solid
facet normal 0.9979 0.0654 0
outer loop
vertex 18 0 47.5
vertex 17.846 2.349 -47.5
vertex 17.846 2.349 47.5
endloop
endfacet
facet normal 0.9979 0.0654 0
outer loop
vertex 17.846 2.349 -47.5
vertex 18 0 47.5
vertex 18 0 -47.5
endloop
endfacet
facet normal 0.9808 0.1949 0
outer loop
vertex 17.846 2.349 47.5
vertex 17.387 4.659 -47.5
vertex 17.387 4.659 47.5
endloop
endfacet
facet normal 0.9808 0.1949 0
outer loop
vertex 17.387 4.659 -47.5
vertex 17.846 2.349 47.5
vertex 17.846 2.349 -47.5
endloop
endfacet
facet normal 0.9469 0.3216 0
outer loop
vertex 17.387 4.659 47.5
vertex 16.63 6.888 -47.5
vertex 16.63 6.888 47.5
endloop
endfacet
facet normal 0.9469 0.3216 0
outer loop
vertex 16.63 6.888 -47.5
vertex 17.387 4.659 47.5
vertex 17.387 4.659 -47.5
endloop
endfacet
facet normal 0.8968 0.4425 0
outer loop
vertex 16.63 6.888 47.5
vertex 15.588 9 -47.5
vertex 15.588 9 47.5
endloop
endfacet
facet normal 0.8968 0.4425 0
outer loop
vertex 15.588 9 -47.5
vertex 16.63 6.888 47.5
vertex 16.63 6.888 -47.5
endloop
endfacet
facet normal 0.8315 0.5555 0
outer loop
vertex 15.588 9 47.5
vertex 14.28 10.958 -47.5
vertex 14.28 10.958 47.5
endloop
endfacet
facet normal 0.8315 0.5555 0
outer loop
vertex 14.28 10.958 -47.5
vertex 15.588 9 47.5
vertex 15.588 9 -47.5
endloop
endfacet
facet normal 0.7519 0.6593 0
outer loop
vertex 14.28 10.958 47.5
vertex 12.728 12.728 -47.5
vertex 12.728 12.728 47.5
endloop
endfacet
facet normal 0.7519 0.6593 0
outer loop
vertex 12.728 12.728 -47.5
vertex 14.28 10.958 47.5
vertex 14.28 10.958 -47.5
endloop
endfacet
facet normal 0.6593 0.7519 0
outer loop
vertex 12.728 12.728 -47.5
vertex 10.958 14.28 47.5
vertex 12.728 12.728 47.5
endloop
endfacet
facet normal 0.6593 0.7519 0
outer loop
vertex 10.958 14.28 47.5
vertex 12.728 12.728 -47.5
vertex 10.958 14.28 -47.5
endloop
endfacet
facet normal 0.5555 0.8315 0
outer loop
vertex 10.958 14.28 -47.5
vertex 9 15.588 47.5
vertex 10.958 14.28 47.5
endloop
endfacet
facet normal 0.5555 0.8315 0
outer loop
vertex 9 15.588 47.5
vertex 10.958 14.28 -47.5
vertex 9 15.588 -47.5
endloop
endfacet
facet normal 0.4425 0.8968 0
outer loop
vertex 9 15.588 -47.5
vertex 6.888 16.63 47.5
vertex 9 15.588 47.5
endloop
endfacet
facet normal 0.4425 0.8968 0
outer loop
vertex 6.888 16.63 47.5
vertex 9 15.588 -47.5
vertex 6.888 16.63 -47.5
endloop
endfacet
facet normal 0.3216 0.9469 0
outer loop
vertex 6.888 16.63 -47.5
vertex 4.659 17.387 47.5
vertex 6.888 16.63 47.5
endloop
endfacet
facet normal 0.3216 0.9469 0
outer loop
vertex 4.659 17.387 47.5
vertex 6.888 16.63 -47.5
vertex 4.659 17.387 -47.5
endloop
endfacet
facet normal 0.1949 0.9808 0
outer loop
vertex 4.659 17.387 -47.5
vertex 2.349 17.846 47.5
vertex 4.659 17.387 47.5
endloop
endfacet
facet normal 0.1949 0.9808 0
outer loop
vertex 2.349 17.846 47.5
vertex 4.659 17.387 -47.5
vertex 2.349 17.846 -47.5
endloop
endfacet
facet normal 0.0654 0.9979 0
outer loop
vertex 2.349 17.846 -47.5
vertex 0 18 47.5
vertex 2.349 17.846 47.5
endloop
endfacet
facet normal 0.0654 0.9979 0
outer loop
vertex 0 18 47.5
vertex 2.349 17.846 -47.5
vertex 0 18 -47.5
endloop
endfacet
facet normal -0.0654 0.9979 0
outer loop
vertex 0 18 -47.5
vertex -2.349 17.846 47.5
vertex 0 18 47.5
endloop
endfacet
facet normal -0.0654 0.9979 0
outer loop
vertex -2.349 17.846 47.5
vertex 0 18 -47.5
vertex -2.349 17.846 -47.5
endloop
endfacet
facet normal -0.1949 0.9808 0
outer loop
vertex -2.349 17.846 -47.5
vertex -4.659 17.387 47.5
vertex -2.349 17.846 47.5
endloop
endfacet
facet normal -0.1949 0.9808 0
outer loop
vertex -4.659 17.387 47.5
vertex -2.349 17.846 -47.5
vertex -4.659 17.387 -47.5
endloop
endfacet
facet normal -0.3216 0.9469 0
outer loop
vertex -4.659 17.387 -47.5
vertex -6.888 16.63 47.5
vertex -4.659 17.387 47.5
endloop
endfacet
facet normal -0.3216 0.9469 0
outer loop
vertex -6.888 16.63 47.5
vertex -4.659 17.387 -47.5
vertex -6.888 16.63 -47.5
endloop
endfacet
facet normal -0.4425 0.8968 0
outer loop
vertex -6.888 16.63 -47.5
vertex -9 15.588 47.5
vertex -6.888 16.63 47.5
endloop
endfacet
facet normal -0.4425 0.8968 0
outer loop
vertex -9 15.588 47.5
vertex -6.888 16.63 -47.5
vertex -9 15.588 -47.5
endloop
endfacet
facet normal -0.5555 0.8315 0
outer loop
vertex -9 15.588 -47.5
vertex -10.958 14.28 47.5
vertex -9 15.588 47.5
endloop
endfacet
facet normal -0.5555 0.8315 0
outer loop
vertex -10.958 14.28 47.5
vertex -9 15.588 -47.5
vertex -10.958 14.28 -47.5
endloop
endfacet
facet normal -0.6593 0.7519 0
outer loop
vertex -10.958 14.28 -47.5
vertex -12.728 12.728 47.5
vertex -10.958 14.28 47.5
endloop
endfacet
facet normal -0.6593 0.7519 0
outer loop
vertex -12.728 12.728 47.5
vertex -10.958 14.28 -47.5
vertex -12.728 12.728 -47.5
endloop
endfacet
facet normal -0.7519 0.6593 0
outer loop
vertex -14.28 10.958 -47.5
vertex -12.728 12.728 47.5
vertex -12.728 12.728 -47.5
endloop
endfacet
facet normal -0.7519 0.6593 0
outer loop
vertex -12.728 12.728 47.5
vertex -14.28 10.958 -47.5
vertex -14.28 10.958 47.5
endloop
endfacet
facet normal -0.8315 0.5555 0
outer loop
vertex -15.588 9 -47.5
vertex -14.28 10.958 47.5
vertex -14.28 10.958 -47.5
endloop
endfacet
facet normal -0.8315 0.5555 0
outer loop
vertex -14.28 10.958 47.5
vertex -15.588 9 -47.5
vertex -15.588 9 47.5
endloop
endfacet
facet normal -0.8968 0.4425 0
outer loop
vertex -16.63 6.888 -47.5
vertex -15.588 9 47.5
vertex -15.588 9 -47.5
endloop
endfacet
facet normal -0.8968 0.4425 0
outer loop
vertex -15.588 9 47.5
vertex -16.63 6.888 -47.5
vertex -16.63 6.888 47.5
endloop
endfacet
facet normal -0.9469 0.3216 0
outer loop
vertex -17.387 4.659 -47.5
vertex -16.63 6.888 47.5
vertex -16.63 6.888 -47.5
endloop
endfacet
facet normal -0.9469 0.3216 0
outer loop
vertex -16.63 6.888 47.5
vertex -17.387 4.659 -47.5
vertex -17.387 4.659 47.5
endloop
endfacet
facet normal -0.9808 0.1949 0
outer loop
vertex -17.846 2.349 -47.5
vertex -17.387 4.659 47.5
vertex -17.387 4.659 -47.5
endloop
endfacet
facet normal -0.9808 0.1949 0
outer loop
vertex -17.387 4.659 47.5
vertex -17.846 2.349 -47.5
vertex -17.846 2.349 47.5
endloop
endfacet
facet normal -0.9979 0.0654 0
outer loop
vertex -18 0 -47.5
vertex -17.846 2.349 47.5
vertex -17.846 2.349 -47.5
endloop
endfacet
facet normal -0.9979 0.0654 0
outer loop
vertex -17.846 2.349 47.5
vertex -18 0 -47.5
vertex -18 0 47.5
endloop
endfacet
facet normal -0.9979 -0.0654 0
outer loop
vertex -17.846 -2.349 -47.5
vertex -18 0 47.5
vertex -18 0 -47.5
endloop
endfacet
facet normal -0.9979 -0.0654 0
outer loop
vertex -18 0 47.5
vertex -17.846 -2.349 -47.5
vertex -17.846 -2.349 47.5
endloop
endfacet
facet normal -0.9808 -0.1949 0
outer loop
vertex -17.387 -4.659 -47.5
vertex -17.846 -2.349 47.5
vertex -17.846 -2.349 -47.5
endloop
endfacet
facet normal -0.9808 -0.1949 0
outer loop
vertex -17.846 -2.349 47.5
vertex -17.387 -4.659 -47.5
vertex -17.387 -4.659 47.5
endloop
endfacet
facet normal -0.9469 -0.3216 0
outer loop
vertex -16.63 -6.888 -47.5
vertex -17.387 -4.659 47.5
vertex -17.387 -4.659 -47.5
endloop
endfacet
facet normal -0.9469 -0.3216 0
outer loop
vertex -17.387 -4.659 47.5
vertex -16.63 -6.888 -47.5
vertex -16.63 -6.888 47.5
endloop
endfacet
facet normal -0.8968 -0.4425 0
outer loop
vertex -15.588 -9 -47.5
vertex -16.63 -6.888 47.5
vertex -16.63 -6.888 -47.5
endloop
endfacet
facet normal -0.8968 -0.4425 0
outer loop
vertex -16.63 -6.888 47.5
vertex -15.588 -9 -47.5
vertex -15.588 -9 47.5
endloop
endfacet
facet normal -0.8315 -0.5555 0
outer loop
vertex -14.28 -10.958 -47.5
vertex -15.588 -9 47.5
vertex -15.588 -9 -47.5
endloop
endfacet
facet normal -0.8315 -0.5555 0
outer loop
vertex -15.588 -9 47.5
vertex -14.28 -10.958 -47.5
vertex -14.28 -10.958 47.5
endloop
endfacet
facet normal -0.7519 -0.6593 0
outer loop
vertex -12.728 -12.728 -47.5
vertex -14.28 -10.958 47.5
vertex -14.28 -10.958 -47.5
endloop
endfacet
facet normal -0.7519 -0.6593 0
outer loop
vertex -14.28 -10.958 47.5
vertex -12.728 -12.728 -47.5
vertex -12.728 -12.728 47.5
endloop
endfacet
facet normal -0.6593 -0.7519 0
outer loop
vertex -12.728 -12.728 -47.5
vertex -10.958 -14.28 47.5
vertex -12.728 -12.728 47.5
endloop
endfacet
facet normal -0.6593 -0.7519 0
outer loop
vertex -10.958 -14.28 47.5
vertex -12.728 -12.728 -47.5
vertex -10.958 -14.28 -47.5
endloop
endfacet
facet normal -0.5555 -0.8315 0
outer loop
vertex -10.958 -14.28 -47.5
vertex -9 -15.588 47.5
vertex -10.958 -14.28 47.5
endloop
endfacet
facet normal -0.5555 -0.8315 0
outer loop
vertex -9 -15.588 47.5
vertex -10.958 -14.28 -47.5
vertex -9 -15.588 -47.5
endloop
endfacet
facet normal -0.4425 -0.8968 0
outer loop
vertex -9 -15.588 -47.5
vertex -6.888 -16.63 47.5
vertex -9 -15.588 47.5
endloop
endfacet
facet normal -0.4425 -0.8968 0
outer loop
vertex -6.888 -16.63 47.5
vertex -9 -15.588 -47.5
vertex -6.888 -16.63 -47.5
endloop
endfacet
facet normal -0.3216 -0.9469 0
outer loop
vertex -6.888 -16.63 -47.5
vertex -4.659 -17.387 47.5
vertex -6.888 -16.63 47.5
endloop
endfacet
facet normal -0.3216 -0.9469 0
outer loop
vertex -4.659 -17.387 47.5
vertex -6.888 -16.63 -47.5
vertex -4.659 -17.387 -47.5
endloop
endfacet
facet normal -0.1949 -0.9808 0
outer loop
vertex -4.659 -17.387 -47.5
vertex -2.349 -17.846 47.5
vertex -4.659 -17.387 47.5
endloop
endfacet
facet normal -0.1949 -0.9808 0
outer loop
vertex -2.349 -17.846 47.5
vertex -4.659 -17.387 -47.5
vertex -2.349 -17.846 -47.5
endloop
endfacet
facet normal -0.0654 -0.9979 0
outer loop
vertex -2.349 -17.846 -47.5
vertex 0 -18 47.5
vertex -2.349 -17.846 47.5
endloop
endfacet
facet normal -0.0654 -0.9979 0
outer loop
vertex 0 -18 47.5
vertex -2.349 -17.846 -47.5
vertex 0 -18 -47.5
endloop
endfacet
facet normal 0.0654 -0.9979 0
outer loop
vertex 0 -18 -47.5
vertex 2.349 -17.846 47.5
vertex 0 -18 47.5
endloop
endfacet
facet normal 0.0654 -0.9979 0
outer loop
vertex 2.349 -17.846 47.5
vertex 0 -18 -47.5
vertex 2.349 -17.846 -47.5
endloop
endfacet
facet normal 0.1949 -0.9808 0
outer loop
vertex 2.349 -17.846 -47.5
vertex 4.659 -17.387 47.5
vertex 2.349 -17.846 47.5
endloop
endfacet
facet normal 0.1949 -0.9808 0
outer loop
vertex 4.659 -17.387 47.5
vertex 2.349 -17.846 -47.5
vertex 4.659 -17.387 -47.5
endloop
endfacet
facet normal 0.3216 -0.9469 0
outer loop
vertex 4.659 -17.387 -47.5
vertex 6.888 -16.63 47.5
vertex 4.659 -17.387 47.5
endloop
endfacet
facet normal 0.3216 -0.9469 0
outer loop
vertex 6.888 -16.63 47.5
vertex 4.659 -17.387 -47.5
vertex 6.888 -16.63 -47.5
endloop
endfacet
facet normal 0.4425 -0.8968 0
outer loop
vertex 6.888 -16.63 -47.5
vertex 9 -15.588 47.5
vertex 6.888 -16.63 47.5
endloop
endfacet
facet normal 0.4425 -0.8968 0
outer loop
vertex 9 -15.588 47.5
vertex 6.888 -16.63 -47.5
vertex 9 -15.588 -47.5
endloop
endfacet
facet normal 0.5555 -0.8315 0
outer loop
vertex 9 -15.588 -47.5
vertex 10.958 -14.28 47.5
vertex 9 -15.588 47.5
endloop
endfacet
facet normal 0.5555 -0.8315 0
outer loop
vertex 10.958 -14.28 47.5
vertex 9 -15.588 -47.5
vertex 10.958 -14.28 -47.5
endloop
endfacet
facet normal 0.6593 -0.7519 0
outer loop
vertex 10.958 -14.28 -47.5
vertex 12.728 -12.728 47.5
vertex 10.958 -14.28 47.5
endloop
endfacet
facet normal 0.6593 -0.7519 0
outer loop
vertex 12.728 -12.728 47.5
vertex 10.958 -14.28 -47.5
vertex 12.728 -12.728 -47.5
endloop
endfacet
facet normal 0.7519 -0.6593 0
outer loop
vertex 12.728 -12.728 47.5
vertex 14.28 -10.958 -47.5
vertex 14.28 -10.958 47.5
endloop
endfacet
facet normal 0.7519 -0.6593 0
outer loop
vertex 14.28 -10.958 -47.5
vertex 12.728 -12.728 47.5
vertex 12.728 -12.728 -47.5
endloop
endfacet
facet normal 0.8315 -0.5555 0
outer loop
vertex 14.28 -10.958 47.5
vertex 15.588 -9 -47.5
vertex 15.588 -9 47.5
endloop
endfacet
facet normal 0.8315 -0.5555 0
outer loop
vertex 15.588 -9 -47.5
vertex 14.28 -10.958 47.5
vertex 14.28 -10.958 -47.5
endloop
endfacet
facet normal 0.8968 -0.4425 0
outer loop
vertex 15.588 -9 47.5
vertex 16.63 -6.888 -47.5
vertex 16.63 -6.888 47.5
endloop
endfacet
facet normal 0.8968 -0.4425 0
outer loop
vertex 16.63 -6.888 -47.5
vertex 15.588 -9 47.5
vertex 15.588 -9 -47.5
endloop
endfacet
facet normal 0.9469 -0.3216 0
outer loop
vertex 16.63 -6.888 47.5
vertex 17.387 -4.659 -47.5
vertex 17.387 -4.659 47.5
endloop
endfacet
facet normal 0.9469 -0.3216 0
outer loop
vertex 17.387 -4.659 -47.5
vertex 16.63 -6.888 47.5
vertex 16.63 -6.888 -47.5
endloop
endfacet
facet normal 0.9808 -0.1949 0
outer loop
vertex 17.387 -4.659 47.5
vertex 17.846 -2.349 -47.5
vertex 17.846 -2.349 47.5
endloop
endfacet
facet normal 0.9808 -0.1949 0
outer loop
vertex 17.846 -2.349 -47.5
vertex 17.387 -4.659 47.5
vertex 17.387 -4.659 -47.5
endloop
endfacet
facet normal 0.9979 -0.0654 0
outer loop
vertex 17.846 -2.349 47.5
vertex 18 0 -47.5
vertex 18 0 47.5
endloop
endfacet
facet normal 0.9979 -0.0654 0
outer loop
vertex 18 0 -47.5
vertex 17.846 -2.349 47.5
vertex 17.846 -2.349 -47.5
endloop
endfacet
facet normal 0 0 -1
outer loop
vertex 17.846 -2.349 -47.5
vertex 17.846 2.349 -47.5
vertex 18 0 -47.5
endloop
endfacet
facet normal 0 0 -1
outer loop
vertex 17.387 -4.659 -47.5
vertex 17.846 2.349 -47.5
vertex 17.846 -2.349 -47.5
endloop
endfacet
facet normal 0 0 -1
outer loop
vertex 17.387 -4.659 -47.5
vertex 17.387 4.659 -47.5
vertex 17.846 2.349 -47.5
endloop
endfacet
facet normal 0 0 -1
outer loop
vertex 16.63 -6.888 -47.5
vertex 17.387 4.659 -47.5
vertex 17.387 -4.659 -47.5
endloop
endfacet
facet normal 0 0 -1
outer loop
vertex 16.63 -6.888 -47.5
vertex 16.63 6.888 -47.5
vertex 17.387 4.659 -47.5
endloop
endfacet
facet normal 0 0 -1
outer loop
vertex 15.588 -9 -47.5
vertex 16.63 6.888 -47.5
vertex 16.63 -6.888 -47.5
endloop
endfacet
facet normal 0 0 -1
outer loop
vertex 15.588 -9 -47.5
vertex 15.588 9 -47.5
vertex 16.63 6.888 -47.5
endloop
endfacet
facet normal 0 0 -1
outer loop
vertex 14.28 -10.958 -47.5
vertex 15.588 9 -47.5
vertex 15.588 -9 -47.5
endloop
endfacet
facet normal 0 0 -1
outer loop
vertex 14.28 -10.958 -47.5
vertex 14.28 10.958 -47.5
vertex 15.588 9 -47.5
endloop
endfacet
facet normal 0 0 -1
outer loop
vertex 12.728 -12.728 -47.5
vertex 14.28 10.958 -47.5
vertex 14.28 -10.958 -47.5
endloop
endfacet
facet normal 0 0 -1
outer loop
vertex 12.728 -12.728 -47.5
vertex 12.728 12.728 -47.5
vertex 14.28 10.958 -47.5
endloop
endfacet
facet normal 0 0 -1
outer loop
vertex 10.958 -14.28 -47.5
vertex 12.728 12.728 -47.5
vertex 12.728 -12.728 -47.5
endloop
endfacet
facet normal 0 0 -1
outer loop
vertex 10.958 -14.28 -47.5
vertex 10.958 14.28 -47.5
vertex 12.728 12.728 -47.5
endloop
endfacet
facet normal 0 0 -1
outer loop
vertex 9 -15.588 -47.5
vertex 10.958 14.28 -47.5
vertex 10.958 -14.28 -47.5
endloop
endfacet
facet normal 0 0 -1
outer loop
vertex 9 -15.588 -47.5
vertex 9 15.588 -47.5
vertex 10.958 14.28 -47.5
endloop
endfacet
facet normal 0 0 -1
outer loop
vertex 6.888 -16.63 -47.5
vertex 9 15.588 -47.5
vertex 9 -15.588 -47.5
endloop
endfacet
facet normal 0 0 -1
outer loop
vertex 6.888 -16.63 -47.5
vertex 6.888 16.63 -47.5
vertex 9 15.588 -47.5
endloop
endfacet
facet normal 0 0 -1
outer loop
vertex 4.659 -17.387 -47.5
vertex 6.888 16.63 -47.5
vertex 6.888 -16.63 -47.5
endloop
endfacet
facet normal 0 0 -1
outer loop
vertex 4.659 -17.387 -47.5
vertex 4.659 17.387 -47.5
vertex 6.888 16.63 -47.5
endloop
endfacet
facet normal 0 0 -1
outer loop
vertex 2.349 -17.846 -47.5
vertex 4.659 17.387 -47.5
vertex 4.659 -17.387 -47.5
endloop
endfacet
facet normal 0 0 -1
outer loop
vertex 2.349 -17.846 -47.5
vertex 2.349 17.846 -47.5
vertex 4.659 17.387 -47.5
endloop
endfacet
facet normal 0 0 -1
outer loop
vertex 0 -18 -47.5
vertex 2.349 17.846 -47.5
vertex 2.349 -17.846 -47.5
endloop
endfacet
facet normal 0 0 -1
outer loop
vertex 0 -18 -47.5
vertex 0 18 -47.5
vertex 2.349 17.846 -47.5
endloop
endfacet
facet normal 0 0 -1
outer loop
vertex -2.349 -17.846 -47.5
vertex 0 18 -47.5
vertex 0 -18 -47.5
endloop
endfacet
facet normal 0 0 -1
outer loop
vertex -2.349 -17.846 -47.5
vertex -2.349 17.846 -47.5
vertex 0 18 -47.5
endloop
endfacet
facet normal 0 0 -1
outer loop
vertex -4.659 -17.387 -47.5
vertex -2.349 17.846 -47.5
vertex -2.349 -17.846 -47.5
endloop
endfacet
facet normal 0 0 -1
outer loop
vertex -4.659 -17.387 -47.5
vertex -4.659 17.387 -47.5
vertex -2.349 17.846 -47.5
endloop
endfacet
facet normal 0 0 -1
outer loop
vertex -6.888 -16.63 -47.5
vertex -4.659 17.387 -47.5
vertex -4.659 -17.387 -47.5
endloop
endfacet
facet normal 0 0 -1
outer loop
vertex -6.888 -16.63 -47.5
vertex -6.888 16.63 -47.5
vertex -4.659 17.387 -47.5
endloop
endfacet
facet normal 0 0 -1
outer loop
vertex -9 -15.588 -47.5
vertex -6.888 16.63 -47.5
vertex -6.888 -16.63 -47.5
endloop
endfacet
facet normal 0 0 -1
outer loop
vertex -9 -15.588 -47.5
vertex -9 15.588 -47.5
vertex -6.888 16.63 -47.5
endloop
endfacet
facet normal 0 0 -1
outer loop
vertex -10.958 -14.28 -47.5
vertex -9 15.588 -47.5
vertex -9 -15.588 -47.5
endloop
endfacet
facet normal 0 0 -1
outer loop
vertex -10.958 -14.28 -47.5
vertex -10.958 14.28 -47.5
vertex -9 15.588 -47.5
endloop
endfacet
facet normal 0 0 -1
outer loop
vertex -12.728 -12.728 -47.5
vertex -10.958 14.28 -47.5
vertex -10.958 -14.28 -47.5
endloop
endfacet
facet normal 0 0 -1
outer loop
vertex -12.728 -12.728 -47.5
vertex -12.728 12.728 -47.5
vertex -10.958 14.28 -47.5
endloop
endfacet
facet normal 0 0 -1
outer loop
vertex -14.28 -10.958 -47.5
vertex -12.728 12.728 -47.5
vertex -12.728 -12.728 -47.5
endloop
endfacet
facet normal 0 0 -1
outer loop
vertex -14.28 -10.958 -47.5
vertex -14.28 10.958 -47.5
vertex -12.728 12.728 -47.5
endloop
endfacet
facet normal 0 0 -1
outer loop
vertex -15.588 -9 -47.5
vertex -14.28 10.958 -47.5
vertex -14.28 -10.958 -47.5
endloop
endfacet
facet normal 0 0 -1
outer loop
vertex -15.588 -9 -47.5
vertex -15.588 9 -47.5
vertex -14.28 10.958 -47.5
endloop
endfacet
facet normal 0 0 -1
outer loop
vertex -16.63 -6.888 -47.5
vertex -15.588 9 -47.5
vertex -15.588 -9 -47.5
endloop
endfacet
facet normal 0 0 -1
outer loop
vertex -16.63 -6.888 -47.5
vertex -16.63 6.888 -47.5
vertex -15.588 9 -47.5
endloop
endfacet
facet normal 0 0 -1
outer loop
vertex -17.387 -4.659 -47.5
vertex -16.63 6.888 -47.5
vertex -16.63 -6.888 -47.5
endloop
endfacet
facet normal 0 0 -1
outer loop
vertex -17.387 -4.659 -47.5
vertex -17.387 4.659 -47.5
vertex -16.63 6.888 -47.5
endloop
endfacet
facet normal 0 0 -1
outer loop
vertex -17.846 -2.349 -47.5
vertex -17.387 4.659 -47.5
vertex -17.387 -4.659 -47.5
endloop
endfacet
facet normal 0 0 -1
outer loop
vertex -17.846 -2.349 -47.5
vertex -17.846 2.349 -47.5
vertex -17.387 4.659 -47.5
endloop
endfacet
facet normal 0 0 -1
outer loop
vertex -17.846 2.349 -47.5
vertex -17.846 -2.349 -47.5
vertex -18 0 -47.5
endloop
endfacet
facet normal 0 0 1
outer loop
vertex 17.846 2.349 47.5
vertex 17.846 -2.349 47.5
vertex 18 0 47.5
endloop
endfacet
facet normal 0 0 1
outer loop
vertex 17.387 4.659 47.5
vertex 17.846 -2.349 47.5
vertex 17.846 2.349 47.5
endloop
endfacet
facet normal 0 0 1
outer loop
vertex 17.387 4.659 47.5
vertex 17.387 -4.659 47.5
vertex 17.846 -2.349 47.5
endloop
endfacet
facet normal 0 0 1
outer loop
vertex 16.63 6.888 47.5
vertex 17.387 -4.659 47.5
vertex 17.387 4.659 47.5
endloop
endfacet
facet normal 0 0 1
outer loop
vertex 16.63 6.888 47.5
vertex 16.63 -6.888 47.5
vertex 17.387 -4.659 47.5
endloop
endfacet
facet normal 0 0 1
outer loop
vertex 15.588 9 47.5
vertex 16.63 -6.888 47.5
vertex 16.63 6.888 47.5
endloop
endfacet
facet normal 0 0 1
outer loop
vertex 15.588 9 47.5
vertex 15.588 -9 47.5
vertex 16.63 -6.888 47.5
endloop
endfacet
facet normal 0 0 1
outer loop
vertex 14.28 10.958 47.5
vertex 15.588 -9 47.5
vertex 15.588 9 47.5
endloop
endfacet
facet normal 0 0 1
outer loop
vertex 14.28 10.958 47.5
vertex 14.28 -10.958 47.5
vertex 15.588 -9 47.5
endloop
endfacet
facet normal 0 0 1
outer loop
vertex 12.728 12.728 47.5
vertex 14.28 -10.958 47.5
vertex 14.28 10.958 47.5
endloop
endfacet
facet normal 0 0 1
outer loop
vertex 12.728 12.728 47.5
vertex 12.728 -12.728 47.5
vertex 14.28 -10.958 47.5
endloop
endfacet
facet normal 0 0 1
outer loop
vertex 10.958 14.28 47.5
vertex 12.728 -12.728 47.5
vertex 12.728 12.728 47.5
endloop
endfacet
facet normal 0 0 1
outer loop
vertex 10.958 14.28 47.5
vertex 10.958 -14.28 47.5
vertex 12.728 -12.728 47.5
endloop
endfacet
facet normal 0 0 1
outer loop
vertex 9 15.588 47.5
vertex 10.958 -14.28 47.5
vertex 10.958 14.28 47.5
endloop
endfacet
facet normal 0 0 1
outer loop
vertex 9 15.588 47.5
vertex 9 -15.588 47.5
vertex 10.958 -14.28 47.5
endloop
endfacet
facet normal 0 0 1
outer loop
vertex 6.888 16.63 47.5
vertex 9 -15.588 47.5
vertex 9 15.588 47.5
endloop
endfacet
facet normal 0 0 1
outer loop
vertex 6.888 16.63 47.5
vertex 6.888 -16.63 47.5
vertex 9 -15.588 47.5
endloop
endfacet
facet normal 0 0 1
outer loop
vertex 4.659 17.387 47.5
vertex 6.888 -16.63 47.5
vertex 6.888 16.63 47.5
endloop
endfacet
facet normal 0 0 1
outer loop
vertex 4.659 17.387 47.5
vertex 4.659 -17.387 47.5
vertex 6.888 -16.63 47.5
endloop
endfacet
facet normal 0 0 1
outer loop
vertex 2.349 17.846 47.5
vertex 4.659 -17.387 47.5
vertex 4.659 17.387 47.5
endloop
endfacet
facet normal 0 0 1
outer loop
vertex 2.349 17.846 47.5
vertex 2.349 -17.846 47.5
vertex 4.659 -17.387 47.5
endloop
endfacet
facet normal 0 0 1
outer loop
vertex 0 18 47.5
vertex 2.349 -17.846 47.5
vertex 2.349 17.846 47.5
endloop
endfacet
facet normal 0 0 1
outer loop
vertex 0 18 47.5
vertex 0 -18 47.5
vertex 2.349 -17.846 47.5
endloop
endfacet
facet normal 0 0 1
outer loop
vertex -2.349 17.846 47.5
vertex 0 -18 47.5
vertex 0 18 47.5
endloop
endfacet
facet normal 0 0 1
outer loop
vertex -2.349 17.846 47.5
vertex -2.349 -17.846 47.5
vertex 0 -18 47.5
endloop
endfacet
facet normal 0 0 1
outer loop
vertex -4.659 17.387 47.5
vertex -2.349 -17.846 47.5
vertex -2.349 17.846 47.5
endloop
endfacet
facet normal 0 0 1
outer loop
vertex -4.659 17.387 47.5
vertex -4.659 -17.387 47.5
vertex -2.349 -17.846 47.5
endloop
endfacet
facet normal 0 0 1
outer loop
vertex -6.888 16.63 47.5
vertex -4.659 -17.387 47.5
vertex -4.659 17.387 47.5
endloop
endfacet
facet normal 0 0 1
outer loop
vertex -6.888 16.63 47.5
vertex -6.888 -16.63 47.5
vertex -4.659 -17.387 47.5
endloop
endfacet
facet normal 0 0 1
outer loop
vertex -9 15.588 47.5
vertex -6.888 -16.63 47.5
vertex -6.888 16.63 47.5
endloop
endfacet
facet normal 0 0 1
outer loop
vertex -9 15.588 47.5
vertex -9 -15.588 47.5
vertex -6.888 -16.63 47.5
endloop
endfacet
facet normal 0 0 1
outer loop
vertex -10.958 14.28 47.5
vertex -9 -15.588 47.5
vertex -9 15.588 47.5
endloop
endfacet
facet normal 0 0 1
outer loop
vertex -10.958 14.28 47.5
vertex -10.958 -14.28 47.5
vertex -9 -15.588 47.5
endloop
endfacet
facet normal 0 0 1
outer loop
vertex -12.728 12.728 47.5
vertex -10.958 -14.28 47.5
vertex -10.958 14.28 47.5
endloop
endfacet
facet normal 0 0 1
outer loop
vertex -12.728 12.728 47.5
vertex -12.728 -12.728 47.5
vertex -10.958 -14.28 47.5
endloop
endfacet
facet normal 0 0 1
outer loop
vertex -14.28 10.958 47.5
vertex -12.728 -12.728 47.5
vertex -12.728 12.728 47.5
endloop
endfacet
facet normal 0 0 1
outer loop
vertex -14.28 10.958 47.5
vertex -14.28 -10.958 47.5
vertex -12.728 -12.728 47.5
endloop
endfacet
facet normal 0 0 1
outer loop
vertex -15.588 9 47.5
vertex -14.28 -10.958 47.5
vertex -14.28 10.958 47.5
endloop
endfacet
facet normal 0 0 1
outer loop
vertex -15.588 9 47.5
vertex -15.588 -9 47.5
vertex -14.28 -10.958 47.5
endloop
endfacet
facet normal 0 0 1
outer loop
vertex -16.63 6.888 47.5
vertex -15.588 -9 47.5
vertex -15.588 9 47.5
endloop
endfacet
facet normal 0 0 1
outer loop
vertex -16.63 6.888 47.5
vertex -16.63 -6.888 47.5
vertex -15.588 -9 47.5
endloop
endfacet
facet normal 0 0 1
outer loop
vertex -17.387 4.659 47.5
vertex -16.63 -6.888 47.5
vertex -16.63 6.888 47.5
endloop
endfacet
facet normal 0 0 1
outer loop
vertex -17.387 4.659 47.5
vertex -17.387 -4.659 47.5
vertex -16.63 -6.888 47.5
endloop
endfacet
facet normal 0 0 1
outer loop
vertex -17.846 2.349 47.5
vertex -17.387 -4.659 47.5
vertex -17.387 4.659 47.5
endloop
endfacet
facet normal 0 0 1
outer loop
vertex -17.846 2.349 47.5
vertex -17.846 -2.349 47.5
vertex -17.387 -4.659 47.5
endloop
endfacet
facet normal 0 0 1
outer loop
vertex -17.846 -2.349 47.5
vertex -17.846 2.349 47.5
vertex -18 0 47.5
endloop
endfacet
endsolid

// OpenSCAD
// ========================================
// a cylinder with radius 18 mm and height 95 mm
// NeuroCAD canonical IR; dimensions are millimetres
// ========================================
$fn = 48;

cylinder(r=18, h=95, center=true);
